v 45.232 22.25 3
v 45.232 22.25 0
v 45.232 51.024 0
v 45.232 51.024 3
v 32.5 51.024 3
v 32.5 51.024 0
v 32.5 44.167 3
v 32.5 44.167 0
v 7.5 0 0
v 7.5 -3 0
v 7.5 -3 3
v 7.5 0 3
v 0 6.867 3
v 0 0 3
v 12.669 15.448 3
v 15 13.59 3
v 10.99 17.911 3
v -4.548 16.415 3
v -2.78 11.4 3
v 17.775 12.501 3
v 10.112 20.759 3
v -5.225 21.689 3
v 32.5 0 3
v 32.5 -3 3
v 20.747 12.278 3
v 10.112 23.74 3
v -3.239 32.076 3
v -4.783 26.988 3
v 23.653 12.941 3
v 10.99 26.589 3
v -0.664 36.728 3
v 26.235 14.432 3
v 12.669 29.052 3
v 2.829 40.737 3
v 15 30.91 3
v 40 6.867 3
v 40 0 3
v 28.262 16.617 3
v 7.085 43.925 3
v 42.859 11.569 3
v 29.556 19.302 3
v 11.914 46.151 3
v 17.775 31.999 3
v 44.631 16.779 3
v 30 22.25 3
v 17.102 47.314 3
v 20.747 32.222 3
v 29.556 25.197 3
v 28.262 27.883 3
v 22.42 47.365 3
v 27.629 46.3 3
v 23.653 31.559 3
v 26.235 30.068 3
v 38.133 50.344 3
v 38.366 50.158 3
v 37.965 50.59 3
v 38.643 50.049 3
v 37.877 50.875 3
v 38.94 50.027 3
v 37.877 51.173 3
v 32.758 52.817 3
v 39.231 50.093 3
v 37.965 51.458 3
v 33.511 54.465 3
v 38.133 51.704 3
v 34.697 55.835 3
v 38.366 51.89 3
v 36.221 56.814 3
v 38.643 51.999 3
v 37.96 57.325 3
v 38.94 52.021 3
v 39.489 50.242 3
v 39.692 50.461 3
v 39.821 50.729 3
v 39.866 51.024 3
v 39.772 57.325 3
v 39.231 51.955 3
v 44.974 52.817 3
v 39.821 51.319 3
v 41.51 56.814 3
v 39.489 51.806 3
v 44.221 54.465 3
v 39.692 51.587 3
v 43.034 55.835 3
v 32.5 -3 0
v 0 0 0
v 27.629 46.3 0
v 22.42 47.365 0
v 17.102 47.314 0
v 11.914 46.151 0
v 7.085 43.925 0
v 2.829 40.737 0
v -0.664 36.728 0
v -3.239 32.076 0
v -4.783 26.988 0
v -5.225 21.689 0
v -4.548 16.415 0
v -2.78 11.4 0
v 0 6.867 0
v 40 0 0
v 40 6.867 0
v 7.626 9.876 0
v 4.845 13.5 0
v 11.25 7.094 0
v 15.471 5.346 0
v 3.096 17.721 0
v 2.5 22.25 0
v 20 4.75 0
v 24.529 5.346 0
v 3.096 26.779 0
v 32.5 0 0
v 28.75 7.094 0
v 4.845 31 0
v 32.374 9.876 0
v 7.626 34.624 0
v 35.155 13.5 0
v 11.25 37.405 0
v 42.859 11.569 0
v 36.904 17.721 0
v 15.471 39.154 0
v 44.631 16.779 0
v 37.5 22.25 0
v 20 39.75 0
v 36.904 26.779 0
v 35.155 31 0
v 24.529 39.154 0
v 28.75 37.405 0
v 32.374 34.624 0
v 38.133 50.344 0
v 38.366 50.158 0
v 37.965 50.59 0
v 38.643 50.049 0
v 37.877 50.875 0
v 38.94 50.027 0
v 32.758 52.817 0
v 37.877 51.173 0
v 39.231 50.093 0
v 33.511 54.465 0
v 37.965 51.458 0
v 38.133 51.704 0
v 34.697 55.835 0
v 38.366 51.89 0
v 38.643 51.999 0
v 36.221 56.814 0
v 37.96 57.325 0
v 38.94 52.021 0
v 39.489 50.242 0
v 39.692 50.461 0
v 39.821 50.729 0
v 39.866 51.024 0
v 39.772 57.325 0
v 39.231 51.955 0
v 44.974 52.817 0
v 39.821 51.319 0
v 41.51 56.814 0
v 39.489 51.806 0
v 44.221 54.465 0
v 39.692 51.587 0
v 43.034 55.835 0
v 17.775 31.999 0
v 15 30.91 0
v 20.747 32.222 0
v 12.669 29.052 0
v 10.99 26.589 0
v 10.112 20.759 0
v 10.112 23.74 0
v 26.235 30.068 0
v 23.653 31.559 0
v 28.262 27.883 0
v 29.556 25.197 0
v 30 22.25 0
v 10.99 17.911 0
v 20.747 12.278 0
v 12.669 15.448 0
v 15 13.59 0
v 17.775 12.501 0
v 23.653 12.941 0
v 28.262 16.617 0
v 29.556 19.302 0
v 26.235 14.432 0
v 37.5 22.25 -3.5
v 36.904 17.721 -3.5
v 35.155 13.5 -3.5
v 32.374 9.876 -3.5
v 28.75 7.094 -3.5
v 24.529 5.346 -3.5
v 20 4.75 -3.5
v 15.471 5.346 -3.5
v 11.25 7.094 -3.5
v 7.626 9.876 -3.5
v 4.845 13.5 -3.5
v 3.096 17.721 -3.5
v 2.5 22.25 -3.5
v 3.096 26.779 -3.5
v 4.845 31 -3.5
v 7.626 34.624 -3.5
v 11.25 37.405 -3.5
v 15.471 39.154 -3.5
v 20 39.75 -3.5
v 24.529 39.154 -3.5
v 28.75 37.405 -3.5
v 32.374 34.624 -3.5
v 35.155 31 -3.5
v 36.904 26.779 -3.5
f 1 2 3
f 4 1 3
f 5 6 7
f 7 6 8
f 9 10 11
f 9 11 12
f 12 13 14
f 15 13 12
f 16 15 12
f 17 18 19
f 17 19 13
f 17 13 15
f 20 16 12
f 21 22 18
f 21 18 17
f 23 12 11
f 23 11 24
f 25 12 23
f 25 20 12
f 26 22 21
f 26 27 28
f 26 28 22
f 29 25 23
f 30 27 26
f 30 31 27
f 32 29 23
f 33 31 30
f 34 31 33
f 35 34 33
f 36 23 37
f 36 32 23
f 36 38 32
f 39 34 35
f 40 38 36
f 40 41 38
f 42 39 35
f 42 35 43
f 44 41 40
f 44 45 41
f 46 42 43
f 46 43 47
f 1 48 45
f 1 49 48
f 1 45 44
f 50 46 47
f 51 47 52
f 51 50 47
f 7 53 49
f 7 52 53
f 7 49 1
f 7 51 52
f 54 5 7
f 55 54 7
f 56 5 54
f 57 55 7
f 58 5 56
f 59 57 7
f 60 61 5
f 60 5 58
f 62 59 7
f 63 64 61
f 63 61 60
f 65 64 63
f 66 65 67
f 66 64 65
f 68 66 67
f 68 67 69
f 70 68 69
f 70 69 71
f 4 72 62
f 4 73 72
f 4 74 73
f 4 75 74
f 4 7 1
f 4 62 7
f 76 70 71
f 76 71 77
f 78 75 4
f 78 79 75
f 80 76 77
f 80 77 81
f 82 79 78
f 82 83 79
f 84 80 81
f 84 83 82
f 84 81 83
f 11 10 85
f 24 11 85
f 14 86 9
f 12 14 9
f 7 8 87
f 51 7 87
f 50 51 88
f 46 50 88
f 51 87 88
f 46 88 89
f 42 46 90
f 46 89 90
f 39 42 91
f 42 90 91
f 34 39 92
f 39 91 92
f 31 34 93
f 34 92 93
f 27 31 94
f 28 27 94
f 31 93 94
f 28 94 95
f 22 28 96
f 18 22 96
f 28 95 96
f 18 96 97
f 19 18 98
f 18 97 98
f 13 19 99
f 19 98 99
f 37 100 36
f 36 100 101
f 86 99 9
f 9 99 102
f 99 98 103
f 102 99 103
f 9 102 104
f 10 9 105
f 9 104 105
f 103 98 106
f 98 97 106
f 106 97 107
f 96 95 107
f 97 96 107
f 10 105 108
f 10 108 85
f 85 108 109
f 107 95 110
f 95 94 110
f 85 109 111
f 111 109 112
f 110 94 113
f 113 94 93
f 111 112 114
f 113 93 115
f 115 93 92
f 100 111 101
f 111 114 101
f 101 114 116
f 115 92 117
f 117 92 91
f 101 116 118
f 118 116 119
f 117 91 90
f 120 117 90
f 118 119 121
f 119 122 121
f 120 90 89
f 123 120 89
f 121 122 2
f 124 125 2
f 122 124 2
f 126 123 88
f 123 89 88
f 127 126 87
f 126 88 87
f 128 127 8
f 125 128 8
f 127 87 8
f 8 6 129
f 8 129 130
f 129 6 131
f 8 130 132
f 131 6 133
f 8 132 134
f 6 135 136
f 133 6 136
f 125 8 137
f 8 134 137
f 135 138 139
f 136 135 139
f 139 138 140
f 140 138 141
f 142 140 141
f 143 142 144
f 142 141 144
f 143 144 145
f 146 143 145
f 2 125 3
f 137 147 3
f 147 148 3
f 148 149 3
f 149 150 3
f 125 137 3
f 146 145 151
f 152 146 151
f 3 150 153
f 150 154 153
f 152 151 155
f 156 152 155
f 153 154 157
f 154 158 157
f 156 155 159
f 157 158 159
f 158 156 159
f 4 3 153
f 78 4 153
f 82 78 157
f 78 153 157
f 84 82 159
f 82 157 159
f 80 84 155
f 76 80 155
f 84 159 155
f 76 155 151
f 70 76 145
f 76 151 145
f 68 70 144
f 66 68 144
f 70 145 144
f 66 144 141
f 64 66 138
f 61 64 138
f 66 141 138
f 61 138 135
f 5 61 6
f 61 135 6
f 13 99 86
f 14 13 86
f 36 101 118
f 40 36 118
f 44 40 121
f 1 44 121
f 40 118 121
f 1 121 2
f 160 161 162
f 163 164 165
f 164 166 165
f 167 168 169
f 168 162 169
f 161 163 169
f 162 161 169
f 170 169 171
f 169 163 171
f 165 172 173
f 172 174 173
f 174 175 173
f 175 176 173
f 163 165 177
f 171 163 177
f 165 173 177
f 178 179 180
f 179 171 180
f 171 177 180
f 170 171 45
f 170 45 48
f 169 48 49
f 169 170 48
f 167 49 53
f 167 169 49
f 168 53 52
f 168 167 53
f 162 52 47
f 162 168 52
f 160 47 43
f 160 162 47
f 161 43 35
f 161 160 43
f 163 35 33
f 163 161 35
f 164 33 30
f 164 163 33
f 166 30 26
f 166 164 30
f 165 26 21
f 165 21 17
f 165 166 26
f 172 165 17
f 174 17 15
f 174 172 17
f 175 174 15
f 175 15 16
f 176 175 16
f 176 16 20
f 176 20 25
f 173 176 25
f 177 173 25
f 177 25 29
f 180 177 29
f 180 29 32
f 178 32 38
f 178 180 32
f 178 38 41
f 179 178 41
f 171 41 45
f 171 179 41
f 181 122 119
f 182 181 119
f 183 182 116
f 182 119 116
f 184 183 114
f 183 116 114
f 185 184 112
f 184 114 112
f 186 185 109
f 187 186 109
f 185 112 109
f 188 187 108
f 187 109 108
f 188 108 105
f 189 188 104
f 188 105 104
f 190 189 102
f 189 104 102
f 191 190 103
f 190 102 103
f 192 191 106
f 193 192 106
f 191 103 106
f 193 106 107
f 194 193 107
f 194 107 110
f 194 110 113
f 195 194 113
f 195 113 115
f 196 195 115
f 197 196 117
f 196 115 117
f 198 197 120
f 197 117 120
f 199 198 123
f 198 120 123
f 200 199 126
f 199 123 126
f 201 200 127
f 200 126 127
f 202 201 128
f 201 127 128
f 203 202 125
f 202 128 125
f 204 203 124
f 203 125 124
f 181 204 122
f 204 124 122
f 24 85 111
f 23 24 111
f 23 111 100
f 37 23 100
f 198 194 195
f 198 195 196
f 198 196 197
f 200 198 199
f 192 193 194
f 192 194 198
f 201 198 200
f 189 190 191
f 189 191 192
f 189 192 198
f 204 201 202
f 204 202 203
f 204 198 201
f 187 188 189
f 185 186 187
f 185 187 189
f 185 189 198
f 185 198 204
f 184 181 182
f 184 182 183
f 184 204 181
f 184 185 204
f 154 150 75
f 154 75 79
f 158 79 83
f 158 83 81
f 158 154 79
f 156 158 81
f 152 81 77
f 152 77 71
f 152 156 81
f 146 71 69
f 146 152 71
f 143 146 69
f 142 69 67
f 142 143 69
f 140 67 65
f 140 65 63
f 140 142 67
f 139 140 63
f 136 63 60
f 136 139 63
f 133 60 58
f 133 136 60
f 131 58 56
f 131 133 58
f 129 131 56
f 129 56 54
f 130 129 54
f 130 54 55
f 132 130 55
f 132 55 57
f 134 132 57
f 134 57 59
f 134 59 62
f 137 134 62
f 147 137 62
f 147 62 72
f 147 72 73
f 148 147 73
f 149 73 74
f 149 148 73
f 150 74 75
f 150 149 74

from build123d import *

# Parameters (mm, degrees)
SKETCH1_R           = 17.265633628
SKETCH1_R_2         = 1
SKETCH1_R_3         = 10
SKETCH1_W           = 25
SKETCH1_H           = 3
BOSS_EXTRUDE5_DEPTH = 3
SKETCH2_R           = 17.5
BOSS_EXTRUDE6_DEPTH = 3.5


with BuildPart() as part:
    # Sketch1 → Boss-Extrude5 (new body)
    # profile 1 of 3: a face of its own
    with BuildSketch(Plane.XY):
        with BuildLine():
            Line((0, 0), (7.5, 0))
            Line((7.5, 0), (32.5, 0))
            Line((32.5, 0), (40, 0))
            Line((40, 0), (40, 6.867081787))
            ThreePointArc((40, 6.867081787), (43.887871625, 14.125845764), (45.231531638, 22.249870507))
            Line((45.231531638, 22.249870507), (45.231531638, 51.023857348))
            ThreePointArc((45.231531638, 51.023857348), (38.865765819, 57.389623167), (32.5, 51.023857348))
            Line((32.5, 51.023857348), (32.5, 44.167447672))
            ThreePointArc((32.5, 44.167447672), (0.97654543, 38.82510399), (0, 6.867081787))
            Line((0, 6.867081787), (0, 0))
        make_face()
        with Locations((20, 22.249870507)):
            Circle(SKETCH1_R, mode=Mode.SUBTRACT)
        with Locations((38.865765819, 51.023857348)):
            Circle(SKETCH1_R_2, mode=Mode.SUBTRACT)
    # profile 2 of 3: a face of its own
    with BuildSketch(Plane.XY):
        with Locations((20, 22.249870507)):
            Circle(SKETCH1_R)
        with Locations((20, 22.249870507)):
            Circle(SKETCH1_R_3, mode=Mode.SUBTRACT)
    # profile 3 of 3: a face of its own
    with BuildSketch(Plane.XY):
        with Locations((20, -1.5)):
            Rectangle(SKETCH1_W, SKETCH1_H)
    extrude(amount=BOSS_EXTRUDE5_DEPTH)

    # Sketch2 → Boss-Extrude6 (add)
    with BuildSketch(Plane(origin=(0, 0, 0), x_dir=(-1, 0, 0), z_dir=(0, 0, -1))):
        with Locations(Location((-20, 22.249870507, 0), (0, 0, 180))):
            Circle(SKETCH2_R)
    extrude(amount=BOSS_EXTRUDE6_DEPTH)


solid = part.part
